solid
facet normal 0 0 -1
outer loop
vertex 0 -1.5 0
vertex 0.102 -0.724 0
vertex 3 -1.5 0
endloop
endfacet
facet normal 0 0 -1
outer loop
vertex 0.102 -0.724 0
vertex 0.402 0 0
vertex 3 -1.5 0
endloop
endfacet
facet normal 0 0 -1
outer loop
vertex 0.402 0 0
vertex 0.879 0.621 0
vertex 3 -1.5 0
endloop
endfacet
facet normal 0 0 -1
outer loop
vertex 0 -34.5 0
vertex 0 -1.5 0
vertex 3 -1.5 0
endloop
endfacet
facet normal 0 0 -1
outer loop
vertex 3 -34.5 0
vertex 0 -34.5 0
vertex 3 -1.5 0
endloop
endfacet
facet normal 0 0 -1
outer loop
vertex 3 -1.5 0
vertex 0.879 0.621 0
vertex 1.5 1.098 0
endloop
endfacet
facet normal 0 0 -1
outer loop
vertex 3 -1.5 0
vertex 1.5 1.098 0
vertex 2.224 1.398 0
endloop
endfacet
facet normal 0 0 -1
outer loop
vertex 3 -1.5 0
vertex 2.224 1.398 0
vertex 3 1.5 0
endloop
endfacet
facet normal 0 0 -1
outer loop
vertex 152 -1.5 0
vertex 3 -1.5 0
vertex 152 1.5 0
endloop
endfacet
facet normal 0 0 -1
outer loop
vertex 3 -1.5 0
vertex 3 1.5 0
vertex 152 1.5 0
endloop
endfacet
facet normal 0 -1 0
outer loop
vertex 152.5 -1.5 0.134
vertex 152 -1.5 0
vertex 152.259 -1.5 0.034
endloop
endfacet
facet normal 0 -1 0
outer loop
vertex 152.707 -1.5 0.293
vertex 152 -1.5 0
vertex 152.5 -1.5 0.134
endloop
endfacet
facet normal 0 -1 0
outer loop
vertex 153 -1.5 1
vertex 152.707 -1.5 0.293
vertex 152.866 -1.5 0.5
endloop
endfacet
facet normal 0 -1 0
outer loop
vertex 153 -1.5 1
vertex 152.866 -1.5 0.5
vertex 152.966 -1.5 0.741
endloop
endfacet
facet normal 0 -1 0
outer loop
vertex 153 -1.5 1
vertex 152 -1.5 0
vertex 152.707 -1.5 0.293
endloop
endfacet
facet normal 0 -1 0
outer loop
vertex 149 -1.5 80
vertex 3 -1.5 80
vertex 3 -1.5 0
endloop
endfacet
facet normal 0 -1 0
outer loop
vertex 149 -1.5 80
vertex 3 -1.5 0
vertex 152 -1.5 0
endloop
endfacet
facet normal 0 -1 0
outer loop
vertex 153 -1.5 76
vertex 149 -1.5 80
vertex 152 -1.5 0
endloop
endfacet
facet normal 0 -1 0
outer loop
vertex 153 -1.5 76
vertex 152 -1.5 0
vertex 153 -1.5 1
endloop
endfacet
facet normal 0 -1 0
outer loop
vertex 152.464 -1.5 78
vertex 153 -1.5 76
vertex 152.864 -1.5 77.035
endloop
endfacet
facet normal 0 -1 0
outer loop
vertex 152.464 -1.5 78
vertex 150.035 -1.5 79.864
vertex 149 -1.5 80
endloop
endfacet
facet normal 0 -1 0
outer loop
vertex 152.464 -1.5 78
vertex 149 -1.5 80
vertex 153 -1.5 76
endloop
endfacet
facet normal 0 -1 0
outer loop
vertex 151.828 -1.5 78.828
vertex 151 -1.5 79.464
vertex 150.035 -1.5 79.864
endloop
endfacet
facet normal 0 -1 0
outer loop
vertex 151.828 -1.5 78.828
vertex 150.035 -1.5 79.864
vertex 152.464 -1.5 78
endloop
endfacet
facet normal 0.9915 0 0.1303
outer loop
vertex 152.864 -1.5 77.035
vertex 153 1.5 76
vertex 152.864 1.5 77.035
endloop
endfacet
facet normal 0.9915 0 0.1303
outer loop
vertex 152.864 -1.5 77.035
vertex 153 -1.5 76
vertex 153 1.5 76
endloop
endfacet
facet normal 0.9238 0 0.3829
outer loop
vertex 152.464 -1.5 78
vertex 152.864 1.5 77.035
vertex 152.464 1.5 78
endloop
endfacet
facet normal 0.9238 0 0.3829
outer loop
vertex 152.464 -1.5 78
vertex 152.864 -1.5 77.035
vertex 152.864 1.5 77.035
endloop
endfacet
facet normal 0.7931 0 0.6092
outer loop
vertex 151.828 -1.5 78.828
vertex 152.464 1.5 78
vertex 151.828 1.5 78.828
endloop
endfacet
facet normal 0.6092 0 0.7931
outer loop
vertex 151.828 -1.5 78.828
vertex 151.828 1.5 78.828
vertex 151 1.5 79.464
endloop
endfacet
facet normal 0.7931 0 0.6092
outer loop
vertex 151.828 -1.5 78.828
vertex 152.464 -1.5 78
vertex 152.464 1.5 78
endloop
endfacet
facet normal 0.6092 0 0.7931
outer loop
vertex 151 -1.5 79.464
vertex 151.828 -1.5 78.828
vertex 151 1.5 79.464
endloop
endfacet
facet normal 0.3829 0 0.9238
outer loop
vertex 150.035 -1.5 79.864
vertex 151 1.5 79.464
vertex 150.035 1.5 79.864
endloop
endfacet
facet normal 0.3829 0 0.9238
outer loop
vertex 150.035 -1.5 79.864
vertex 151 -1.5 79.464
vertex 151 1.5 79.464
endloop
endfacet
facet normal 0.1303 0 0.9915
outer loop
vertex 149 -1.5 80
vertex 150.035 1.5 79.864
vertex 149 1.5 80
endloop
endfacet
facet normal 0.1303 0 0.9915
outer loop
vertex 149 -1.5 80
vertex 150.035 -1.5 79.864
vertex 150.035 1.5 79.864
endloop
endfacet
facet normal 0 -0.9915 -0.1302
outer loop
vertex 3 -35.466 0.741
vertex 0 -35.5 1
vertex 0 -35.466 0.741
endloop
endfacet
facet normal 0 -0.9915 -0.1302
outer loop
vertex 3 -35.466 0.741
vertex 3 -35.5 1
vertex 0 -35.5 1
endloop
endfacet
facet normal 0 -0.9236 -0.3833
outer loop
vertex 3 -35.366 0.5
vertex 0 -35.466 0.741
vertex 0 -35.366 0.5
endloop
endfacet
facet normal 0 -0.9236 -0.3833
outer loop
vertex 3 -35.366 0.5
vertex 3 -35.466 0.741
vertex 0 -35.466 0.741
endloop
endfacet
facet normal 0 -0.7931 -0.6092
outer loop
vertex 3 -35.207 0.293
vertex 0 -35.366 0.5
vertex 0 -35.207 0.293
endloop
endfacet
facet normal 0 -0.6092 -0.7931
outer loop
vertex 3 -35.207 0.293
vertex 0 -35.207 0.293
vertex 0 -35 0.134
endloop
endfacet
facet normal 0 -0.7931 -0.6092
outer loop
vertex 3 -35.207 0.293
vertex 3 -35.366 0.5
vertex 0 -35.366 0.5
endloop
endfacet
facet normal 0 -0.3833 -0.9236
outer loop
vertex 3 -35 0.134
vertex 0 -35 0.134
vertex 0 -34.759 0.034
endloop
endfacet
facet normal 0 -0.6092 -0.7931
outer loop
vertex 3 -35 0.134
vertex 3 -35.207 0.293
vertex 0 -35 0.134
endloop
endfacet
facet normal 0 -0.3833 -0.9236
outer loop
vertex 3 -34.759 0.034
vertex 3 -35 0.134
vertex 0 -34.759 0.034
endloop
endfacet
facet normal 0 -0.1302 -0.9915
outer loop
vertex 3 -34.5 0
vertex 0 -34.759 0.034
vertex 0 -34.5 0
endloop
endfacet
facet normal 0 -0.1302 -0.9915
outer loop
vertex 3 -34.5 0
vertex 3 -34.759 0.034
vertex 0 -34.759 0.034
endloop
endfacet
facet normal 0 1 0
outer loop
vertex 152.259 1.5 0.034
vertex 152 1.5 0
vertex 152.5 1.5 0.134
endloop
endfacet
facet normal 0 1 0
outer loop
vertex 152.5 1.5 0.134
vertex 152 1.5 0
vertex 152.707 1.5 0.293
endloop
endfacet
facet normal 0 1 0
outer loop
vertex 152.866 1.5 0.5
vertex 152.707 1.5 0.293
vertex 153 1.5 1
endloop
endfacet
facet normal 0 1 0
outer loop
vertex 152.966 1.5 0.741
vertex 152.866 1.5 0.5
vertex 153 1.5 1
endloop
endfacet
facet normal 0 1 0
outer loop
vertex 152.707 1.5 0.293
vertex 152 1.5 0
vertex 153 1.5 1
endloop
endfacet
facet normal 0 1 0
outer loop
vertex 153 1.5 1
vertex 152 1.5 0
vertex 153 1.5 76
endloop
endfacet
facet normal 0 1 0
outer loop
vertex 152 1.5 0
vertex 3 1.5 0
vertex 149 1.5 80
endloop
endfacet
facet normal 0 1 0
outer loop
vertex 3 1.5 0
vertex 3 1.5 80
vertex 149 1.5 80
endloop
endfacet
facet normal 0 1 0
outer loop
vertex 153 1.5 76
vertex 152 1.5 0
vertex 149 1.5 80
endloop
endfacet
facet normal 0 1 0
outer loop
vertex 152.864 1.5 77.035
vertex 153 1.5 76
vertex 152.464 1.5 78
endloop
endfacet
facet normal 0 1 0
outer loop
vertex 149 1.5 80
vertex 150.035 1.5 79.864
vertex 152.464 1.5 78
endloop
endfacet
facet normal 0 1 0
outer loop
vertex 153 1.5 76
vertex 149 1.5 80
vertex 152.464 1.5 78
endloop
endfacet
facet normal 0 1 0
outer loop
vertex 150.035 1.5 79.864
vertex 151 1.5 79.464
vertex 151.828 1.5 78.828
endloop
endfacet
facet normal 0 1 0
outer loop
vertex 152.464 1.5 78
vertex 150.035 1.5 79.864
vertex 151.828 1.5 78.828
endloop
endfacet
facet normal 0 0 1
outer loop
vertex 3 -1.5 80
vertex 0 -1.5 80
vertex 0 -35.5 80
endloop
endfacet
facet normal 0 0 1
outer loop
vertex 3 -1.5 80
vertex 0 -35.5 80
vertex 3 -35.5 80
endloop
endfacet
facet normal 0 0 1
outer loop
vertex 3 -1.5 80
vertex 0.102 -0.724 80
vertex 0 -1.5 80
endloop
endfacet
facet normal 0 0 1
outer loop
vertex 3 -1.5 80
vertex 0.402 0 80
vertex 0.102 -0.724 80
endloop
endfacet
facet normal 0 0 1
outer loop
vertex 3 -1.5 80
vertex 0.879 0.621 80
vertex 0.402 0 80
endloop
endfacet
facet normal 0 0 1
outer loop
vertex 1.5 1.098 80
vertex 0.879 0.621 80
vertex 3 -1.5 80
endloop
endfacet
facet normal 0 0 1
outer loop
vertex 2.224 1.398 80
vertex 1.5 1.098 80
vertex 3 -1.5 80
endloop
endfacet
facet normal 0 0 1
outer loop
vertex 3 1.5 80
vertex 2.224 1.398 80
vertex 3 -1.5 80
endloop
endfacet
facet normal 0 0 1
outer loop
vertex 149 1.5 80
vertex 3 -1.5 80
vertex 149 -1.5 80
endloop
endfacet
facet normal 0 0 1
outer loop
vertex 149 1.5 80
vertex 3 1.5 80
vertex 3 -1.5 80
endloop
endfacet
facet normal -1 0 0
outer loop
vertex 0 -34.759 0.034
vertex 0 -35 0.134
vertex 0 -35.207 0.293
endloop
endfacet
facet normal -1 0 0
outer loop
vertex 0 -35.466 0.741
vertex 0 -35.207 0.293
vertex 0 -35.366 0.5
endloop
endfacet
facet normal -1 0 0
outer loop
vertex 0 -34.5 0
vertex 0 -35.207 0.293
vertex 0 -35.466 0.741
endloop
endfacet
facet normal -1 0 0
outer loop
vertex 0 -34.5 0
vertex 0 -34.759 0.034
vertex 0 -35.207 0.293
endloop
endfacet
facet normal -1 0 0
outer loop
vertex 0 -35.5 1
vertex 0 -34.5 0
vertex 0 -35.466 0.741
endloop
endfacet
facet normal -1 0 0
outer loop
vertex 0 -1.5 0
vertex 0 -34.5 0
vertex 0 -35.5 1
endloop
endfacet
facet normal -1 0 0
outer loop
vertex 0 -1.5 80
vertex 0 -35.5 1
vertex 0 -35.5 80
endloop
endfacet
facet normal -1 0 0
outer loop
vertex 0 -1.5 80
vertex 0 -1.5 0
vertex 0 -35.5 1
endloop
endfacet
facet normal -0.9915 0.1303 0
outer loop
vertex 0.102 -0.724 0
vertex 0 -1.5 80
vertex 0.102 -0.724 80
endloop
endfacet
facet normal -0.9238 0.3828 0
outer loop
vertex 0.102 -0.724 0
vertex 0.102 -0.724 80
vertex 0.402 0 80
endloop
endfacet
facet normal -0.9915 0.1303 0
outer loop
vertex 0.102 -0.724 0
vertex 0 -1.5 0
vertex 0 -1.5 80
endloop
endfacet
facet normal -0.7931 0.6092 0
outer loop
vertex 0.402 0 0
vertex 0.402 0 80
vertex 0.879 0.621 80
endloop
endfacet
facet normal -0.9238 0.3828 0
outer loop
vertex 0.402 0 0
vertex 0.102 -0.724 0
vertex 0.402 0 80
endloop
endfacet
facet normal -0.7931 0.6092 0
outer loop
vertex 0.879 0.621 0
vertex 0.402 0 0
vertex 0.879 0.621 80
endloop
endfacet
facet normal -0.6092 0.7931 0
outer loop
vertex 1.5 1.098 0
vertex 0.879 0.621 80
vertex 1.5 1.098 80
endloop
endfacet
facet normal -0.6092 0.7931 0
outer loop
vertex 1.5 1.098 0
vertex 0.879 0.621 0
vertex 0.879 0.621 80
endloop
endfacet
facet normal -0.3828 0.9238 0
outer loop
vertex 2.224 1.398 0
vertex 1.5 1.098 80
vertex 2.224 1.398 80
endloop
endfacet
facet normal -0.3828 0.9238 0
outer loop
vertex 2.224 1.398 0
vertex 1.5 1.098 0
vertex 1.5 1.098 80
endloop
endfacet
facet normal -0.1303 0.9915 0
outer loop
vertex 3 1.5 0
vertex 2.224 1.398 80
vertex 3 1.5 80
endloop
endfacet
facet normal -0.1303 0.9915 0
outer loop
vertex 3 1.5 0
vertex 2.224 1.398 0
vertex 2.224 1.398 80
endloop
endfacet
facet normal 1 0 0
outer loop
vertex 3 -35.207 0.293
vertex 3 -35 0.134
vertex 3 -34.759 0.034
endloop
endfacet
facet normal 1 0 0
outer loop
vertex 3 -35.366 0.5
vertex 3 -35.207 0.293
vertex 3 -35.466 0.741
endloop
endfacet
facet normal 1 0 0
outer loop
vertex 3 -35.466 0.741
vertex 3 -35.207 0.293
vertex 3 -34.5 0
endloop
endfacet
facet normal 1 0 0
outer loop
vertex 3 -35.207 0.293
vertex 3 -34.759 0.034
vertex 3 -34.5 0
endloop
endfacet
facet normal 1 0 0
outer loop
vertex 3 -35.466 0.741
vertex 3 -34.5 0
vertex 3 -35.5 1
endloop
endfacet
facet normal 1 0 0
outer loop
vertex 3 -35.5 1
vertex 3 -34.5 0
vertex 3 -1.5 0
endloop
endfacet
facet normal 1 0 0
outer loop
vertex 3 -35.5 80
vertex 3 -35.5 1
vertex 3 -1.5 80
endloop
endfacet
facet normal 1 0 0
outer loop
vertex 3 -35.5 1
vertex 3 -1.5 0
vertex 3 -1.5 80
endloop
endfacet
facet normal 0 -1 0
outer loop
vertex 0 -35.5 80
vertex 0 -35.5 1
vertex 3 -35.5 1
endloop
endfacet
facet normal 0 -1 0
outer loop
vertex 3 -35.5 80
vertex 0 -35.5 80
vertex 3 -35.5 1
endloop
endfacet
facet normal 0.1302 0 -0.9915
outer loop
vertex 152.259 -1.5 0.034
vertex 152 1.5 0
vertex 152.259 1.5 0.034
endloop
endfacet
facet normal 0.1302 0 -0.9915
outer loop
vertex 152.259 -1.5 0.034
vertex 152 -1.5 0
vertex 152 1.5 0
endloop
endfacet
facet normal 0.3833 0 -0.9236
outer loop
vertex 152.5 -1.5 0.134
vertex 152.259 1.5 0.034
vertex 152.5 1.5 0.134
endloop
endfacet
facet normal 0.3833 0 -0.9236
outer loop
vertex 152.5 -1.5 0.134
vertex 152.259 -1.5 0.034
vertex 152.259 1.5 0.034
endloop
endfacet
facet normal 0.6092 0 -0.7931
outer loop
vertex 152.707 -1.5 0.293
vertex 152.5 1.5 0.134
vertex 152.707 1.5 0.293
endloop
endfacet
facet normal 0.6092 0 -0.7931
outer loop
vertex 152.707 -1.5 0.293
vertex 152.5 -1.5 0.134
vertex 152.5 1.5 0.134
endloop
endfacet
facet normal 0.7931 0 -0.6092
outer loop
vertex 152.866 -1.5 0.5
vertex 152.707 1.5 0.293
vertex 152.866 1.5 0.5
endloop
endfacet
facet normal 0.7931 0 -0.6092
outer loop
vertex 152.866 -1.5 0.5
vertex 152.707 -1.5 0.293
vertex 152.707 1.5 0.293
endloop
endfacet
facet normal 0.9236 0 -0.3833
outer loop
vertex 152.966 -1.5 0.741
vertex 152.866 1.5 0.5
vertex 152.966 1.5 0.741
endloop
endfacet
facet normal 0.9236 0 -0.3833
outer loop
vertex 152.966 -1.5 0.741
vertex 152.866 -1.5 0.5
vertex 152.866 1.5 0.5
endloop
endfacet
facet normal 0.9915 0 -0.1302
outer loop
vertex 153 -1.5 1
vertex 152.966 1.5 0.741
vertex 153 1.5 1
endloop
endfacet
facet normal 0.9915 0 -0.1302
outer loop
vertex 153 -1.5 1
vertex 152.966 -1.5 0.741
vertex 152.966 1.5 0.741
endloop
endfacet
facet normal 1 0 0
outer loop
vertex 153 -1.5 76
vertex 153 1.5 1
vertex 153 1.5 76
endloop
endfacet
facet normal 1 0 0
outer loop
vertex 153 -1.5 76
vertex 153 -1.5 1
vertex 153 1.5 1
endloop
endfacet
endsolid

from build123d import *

# Parameters (mm, degrees)
F1_DEPTH = 1.5
F2_W     = 3
F2_H     = 80
F3_DEPTH = 34
F4_R     = 3
F5_R     = 1


with BuildPart() as f1:
    # F0 (on Front) → F1 (new body, symmetric)
    with BuildSketch(Plane.XZ):
        with BuildLine():
            Line((0, 80), (0, 0))
            Line((0, 0), (153, 0))
            Line((153, 0), (153, 76))
            ThreePointArc((153, 76), (151.828427, 78.828427), (149, 80))
            Line((149, 80), (0, 80))
        make_face()
    extrude(amount=F1_DEPTH, both=True)

    # F2 (on face) → F3 (join)
    with BuildSketch(Plane.XZ.offset(1.5)):
        with Locations((1.5, 40)):
            Rectangle(F2_W, F2_H)
    extrude(amount=F3_DEPTH)

    # F4
    f4_edges = [f1.edges().sort_by_distance(p)[0] for p in [
        (0, 1.5, 40),
    ]]
    fillet(f4_edges, radius=F4_R)

    # F5
    f5_edges = [f1.edges().sort_by_distance(p)[0] for p in [
        (1.5, -35.5, 0),
        (153, 0, 0),
    ]]
    fillet(f5_edges, radius=F5_R)


solid = f1.part
